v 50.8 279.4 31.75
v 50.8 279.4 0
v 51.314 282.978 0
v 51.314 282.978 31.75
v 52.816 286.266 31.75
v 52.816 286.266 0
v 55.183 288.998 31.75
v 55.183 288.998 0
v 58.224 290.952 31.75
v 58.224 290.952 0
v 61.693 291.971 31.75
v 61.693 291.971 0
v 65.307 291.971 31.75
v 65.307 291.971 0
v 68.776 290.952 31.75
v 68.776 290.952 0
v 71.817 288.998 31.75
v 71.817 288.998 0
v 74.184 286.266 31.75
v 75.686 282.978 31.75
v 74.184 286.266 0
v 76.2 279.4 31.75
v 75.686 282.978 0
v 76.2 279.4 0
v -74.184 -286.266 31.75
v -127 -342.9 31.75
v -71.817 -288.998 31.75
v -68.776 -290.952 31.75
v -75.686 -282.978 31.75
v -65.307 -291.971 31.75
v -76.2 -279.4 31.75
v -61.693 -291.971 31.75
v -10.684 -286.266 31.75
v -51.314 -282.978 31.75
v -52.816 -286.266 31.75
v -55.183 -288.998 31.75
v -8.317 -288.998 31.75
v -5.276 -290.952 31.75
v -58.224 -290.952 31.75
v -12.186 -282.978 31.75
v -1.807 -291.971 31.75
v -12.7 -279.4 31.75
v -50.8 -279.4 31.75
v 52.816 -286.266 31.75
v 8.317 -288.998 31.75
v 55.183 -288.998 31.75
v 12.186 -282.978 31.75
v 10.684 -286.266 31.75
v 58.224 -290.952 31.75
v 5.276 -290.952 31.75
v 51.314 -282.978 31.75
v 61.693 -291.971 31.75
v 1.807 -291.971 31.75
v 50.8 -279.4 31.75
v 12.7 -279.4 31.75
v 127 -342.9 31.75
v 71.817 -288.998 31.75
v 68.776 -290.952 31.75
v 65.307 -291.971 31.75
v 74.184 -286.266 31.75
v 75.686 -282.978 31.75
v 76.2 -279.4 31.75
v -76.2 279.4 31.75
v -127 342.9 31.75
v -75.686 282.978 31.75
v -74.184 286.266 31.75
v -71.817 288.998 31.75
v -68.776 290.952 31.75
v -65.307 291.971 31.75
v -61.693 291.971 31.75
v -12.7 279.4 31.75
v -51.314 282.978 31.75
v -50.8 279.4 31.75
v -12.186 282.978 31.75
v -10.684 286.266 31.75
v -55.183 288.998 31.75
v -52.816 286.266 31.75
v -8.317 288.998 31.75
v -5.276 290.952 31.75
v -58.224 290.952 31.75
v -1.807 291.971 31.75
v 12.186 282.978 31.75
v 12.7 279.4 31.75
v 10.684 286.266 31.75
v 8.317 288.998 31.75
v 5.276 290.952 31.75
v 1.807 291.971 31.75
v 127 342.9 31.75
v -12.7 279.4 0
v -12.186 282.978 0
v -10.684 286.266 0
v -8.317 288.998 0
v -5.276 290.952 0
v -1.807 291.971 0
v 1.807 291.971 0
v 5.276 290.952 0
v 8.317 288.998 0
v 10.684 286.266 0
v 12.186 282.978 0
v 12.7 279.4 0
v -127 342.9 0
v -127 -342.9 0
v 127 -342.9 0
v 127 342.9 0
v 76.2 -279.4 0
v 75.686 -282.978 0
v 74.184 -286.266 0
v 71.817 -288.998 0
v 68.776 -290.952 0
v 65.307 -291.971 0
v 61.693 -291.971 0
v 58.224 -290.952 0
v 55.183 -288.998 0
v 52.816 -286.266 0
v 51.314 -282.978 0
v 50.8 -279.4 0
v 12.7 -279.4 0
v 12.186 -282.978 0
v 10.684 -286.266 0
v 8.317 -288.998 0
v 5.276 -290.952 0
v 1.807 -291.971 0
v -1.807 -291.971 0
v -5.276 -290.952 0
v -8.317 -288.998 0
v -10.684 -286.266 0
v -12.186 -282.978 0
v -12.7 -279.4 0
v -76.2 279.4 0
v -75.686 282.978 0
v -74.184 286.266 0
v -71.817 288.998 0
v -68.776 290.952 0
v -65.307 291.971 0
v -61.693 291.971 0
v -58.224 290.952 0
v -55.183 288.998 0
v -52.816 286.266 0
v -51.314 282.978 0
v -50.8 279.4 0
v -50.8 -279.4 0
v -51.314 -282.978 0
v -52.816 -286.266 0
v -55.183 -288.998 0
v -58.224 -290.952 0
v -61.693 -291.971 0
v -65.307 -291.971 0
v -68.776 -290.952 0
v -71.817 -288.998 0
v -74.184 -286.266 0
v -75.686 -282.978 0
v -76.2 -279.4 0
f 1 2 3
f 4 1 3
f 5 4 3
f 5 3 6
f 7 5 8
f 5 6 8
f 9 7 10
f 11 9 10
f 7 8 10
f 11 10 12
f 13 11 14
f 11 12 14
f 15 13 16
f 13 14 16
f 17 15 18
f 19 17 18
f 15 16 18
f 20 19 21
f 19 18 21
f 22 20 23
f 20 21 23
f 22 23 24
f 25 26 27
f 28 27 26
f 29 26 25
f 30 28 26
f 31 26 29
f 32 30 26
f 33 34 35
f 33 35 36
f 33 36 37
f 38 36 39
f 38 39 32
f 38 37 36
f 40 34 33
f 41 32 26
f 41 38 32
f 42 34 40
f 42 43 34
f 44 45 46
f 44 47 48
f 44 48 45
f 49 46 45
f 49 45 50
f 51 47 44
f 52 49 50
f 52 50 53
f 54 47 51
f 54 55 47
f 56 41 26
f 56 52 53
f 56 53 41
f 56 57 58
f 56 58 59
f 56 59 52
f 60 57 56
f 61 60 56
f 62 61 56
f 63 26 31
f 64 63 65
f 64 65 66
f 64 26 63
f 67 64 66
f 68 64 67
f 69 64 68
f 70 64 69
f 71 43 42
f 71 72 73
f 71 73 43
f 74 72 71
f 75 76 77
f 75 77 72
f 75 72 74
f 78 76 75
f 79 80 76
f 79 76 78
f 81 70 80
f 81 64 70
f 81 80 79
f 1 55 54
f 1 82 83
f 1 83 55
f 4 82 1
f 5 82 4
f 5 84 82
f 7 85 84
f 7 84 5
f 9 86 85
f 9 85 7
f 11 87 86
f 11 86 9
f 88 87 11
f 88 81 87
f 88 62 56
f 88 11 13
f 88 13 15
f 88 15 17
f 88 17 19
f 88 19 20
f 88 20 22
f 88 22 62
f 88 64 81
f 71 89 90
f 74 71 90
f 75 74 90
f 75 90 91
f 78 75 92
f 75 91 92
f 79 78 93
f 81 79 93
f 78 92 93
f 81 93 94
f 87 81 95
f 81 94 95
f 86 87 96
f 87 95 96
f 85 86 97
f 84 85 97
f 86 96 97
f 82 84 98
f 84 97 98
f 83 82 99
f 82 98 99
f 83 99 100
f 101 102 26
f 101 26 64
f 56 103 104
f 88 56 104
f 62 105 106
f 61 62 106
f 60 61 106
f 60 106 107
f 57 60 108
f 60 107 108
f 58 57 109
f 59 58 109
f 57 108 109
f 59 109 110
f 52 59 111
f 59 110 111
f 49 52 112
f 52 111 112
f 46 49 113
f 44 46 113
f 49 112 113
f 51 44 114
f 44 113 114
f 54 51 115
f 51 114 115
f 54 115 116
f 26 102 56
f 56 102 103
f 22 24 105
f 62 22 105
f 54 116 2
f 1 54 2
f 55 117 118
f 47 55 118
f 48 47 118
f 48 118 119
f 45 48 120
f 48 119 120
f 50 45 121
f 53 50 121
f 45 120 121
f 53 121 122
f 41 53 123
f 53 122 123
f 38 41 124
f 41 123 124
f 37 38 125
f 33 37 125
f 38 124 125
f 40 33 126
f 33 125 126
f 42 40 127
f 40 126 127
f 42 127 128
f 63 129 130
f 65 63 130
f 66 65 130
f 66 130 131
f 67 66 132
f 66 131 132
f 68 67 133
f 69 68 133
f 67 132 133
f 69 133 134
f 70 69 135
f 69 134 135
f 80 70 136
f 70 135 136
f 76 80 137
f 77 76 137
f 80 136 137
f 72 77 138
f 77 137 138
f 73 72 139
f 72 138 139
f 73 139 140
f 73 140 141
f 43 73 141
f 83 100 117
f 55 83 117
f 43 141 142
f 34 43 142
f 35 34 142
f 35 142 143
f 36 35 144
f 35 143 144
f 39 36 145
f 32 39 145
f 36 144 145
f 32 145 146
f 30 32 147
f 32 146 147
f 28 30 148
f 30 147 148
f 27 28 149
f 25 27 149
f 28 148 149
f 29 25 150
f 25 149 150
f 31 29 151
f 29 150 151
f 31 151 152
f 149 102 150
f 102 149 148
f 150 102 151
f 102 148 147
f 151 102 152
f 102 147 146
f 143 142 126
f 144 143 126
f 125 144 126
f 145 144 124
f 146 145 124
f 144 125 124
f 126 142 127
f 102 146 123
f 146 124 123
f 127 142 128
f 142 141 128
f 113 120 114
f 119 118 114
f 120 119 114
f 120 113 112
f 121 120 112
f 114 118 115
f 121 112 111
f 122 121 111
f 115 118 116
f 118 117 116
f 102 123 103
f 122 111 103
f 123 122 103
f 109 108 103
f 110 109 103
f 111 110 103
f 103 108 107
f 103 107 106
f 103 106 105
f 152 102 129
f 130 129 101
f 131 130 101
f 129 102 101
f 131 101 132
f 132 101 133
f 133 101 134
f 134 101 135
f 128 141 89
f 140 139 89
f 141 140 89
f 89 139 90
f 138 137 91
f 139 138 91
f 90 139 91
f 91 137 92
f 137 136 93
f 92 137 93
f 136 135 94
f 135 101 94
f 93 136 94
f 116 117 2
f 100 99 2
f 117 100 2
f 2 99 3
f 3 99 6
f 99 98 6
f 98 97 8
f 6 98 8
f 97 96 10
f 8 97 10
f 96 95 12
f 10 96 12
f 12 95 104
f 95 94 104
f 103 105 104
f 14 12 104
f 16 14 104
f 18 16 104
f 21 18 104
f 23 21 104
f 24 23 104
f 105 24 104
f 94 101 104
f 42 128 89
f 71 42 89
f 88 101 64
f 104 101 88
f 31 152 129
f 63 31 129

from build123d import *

# Parameters (mm, degrees)
F0_W     = 254
F0_H     = 685.8
F1_DEPTH = 31.75


with BuildPart() as f1:
    # F0 (on Top) → F1 (new body)
    with BuildSketch(Plane.XY):
        Rectangle(F0_W, F0_H)
        with BuildLine():
            ThreePointArc((-76.2, 279.4), (-63.5, 292.1), (-50.8, 279.4))
            Line((-50.8, 279.4), (-50.8, -279.4))
            ThreePointArc((-50.8, -279.4), (-63.5, -292.1), (-76.2, -279.4))
            Line((-76.2, -279.4), (-76.2, 279.4))
        make_face(mode=Mode.SUBTRACT)
        with BuildLine():
            ThreePointArc((-12.7, 279.4), (0, 292.1), (12.7, 279.4))
            Line((12.7, 279.4), (12.7, -279.4))
            ThreePointArc((12.7, -279.4), (0, -292.1), (-12.7, -279.4))
            Line((-12.7, -279.4), (-12.7, 279.4))
        make_face(mode=Mode.SUBTRACT)
        with BuildLine():
            ThreePointArc((50.8, 279.4), (63.5, 292.1), (76.2, 279.4))
            Line((76.2, 279.4), (76.2, -279.4))
            ThreePointArc((76.2, -279.4), (63.5, -292.1), (50.8, -279.4))
            Line((50.8, -279.4), (50.8, 279.4))
        make_face(mode=Mode.SUBTRACT)
    extrude(amount=F1_DEPTH)


solid = f1.part
